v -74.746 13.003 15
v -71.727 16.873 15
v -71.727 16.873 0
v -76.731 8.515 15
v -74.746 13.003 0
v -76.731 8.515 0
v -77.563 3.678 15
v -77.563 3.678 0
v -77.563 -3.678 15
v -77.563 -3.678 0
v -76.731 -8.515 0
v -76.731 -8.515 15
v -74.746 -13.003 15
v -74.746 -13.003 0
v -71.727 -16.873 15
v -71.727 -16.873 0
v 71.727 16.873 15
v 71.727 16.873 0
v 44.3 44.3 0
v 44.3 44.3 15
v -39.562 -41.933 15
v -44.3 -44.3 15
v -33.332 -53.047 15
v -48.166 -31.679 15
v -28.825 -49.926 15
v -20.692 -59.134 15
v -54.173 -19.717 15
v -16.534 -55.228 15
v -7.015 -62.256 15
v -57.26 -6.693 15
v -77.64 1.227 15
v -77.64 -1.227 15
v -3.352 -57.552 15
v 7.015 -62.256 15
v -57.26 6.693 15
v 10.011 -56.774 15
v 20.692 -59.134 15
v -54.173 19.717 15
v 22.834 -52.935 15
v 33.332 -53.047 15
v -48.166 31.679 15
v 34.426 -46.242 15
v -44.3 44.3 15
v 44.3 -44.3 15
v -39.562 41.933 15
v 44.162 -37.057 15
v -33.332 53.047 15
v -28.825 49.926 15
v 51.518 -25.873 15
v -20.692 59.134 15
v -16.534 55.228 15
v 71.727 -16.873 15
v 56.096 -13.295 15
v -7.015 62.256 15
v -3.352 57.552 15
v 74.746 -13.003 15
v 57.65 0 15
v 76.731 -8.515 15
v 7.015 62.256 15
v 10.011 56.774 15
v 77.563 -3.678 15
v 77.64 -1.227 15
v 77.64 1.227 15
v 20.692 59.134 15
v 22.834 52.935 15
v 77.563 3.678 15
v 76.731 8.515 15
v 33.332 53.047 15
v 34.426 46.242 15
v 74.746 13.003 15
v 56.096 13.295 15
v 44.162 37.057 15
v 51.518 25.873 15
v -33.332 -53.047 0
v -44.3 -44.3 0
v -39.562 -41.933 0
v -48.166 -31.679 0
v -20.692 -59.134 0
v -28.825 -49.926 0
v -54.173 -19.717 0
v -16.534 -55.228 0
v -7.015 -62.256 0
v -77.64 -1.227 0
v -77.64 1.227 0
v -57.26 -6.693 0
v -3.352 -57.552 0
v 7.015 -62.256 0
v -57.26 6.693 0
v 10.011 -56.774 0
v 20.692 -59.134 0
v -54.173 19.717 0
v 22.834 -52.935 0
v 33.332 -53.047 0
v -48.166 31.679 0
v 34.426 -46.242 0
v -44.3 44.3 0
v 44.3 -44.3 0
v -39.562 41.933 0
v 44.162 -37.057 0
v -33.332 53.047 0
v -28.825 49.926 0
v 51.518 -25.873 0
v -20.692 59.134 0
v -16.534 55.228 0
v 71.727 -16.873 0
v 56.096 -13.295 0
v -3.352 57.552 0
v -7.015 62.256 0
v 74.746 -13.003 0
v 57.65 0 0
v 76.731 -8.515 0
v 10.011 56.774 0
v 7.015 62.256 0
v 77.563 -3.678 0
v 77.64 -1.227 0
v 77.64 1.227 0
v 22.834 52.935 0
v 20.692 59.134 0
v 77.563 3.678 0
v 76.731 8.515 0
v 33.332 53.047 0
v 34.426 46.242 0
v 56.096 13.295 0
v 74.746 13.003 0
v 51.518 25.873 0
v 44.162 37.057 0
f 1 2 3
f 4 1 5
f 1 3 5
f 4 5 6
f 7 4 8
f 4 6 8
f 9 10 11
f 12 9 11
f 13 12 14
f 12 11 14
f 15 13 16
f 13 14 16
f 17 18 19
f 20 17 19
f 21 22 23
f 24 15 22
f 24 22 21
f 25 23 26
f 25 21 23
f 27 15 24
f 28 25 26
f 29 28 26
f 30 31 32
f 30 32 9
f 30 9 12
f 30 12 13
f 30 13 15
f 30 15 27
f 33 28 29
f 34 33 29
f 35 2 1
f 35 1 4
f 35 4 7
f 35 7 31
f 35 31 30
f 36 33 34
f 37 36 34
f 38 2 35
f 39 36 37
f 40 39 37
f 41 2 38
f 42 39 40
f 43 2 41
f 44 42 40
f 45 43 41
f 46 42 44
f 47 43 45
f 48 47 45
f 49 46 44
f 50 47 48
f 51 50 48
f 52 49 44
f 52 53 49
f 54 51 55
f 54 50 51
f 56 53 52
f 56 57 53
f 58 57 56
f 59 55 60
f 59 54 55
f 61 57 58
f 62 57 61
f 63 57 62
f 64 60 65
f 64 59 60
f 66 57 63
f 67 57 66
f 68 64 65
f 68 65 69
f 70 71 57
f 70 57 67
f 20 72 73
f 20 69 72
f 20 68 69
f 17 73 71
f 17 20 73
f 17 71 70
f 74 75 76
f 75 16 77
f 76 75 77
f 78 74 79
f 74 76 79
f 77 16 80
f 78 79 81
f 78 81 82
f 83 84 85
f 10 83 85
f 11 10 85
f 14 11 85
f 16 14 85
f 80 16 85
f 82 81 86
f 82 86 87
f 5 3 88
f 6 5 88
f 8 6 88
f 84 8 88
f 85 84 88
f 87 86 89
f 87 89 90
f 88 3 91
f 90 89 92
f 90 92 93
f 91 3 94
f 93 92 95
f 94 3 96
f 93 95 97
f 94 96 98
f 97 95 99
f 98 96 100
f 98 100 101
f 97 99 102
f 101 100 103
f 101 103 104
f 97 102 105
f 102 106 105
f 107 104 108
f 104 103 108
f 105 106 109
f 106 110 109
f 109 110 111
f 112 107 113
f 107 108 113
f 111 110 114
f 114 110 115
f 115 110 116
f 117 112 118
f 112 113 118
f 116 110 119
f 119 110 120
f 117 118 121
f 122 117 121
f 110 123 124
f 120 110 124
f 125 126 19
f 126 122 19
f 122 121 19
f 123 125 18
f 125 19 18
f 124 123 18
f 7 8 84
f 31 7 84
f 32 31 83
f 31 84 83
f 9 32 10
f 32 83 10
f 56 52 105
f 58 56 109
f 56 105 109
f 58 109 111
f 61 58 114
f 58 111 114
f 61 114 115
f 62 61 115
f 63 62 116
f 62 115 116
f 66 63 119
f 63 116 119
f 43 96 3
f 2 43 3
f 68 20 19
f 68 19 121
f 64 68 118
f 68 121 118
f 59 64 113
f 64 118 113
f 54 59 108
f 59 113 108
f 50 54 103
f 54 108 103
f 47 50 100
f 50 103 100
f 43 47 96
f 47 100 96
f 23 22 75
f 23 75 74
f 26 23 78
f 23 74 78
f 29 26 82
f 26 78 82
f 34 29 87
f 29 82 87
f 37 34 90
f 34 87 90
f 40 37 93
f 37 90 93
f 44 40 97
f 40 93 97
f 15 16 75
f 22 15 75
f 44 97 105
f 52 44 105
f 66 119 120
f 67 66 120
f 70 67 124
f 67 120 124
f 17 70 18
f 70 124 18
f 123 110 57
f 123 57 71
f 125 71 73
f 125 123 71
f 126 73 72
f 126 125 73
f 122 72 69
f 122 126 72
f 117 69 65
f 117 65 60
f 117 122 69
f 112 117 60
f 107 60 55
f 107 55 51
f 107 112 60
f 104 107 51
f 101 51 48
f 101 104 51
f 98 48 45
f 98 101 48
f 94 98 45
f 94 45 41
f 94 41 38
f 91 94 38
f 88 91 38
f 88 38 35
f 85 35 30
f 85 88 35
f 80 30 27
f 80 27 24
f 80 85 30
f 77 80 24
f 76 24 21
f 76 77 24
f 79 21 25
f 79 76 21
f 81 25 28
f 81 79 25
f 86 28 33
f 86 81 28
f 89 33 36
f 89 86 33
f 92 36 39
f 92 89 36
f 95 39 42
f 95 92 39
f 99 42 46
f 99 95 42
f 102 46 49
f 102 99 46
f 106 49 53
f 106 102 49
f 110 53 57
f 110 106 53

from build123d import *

# Parameters (mm, degrees)
F0_R     = 57.65
F1_DEPTH = 15


with BuildPart() as f1:
    # F0 (on Top) → F1 (new body)
    with BuildSketch(Plane.XY):
        with BuildLine():
            Line((71.727416, 16.873064), (44.30024, 44.30024))
            ThreePointArc((44.30024, 44.30024), (0, 62.65), (-44.30024, 44.30024))
            Line((-44.30024, 44.30024), (-71.727416, 16.873064))
            ThreePointArc((-71.727416, 16.873064), (-75.876353, 10.82022), (-77.562828, 3.678344))
            ThreePointArc((-77.562828, 3.678344), (-77.65, 0), (-77.562828, -3.678344))
            ThreePointArc((-77.562828, -3.678344), (-75.876353, -10.82022), (-71.727416, -16.873064))
            Line((-71.727416, -16.873064), (-44.30024, -44.30024))
            ThreePointArc((-44.30024, -44.30024), (0, -62.65), (44.30024, -44.30024))
            Line((44.30024, -44.30024), (71.727416, -16.873064))
            ThreePointArc((71.727416, -16.873064), (75.876353, -10.82022), (77.562828, -3.678344))
            ThreePointArc((77.562828, -3.678344), (77.65, 0), (77.562828, 3.678344))
            ThreePointArc((77.562828, 3.678344), (75.876353, 10.82022), (71.727416, 16.873064))
        make_face()
        Circle(F0_R, mode=Mode.SUBTRACT)
    extrude(amount=F1_DEPTH)


solid = f1.part
